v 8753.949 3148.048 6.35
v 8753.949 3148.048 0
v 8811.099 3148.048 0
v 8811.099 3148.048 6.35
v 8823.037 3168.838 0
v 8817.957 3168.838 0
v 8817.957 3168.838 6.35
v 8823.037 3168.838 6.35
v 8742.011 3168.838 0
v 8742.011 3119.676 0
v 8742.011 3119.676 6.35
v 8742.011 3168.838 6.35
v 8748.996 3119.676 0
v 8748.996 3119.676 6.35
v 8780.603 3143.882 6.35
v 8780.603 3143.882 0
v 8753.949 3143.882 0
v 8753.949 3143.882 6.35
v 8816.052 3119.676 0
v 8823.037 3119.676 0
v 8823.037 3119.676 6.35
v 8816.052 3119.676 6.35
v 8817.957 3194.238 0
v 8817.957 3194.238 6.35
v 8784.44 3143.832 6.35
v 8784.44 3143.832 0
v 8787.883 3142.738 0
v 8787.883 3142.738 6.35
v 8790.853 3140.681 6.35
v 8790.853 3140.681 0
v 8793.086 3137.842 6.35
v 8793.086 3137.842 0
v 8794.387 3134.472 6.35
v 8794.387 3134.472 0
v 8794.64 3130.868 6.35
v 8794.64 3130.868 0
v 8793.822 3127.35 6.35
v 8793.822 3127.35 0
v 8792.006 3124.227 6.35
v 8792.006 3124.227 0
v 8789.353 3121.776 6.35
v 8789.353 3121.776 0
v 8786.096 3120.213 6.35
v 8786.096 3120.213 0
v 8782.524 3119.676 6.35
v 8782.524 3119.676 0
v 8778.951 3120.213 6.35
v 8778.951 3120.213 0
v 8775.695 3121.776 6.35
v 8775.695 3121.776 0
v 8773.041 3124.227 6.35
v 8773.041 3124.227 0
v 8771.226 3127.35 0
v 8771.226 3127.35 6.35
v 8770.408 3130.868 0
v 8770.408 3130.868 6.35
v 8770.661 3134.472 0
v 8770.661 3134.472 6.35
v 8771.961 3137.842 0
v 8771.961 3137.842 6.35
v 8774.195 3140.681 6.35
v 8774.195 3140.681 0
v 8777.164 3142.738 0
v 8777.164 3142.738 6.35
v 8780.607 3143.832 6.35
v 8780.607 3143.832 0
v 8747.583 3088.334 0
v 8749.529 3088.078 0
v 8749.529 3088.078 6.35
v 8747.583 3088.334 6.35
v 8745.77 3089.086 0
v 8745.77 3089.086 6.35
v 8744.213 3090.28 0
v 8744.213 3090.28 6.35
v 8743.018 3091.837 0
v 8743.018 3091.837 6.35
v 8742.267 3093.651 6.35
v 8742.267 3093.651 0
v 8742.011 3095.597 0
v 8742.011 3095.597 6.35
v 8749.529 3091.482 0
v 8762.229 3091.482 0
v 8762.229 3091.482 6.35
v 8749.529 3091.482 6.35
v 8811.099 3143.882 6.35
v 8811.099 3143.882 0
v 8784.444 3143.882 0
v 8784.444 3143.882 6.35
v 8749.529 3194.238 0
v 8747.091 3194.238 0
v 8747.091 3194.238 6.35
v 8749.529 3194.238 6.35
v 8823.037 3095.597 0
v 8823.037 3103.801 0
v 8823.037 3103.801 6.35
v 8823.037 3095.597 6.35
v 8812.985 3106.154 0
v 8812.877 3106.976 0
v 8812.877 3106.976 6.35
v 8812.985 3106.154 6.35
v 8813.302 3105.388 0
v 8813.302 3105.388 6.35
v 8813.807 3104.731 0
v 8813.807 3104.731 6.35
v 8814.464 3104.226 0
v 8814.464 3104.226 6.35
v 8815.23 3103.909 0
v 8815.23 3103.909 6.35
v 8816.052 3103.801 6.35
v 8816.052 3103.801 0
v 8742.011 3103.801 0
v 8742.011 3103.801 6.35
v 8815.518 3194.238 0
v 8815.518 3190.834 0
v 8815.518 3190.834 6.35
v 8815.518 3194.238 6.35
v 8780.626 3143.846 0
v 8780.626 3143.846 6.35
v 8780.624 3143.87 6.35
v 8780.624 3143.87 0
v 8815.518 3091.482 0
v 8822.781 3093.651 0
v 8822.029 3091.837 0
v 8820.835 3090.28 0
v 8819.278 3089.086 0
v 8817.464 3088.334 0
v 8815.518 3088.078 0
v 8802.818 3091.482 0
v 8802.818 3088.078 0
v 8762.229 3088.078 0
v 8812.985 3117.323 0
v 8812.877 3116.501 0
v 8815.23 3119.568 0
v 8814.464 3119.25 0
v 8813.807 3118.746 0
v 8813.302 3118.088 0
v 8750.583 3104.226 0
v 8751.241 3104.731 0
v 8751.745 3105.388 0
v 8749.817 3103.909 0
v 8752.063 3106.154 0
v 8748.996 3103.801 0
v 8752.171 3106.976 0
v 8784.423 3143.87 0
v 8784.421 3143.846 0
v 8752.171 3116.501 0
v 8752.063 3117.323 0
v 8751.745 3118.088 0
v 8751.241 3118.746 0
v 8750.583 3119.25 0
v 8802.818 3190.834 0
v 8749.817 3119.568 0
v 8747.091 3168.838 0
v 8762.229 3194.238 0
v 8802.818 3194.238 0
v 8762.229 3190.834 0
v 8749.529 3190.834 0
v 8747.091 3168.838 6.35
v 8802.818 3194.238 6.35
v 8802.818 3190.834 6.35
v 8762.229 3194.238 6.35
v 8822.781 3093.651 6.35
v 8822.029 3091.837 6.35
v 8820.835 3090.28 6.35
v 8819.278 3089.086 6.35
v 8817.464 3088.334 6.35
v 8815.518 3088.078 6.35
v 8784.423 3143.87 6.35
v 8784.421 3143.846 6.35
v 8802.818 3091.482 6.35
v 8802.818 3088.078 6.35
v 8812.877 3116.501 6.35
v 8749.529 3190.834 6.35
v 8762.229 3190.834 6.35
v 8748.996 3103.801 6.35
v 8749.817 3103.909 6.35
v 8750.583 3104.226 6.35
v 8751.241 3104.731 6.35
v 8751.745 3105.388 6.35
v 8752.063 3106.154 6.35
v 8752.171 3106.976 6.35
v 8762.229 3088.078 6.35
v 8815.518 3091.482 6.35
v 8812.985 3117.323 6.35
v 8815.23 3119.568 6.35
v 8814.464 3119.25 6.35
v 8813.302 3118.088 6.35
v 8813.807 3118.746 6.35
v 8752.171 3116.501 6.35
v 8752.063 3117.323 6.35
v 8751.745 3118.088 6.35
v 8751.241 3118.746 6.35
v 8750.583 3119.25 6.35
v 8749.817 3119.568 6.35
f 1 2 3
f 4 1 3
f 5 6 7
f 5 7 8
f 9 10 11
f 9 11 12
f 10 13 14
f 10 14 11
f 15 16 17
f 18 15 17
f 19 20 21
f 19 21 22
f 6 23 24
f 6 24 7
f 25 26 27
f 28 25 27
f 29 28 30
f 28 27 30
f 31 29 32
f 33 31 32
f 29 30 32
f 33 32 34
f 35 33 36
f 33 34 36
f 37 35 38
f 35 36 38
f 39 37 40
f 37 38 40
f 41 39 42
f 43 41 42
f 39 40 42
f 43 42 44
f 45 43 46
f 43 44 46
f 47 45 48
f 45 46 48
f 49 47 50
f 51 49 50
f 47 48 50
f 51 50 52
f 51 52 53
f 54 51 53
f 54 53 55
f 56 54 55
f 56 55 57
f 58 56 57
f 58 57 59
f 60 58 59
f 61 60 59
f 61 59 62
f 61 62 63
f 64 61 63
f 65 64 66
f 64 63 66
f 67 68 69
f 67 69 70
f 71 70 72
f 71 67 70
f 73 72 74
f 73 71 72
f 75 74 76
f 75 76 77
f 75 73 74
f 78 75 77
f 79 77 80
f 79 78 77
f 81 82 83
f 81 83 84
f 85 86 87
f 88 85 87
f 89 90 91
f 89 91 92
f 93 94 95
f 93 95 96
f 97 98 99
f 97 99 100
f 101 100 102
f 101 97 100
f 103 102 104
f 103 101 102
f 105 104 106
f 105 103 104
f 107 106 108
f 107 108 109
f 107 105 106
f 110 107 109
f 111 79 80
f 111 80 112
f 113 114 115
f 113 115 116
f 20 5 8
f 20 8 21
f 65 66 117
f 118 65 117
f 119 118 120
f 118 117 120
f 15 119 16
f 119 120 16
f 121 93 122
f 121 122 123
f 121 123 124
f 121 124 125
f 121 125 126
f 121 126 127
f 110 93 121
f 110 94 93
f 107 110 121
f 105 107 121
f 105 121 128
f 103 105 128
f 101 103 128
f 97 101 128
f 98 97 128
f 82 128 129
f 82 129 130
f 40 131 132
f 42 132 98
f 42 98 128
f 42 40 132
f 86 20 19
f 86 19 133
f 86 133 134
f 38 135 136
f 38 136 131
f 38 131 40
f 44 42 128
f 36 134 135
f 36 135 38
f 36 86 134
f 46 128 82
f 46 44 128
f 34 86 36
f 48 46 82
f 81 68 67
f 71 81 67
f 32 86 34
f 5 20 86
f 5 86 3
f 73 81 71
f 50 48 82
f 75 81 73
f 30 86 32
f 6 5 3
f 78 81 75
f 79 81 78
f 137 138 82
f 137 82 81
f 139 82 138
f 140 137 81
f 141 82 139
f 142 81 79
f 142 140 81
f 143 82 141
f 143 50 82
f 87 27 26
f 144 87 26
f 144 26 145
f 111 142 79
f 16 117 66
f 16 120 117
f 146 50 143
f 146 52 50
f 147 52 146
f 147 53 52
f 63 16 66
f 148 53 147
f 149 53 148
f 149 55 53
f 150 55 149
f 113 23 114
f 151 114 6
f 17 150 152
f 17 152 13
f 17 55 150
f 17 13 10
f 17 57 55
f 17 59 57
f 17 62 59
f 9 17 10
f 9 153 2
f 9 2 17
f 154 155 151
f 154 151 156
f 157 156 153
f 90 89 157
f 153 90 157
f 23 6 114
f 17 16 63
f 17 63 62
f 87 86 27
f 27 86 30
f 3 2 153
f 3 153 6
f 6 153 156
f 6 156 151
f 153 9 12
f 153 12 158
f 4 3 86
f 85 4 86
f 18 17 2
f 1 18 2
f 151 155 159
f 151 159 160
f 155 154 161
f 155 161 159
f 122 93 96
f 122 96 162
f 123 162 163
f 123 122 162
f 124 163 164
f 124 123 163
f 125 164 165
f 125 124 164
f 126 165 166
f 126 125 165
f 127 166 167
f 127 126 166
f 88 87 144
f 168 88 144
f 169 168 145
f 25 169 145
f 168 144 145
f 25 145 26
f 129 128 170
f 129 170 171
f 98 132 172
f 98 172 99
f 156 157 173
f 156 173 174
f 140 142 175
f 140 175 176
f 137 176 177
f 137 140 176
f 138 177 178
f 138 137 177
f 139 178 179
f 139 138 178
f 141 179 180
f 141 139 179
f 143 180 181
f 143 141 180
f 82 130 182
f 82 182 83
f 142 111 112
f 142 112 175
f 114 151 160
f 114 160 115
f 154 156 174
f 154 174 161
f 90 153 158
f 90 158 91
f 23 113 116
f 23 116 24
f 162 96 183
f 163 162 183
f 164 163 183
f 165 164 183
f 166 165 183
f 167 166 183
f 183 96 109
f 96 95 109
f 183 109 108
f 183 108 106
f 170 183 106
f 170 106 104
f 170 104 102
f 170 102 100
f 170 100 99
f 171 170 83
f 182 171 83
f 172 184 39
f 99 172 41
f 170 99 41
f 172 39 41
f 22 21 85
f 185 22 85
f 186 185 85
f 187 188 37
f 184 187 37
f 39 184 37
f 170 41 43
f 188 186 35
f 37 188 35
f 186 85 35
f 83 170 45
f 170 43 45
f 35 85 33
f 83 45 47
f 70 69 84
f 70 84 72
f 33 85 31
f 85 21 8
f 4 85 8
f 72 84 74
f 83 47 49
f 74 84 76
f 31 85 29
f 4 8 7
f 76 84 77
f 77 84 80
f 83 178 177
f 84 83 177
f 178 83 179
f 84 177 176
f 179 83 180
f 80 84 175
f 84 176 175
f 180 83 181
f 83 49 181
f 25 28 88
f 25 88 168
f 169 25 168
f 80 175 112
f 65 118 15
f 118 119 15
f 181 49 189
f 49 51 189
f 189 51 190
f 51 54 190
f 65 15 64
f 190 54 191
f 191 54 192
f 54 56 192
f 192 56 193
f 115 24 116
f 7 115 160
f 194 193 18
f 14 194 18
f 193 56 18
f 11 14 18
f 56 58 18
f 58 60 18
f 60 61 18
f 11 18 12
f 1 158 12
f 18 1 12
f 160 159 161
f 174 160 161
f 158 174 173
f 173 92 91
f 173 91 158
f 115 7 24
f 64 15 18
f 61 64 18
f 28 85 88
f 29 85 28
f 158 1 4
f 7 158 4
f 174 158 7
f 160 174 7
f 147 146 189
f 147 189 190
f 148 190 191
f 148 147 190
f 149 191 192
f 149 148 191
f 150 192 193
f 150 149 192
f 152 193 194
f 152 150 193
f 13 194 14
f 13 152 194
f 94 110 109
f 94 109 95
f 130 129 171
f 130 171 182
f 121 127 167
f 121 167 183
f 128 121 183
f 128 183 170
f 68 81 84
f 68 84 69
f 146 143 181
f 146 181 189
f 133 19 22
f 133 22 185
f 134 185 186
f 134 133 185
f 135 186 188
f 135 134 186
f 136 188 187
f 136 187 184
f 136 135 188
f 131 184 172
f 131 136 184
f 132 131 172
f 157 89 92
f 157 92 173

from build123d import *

# Parameters (mm, degrees)
BOSS_EXTRUDE1_DEPTH = 6.35


with BuildPart() as part:
    # Sketch1 → Boss-Extrude1 (new body)
    with BuildSketch(Plane.XY):
        with BuildLine():
            Line((8823.036740753, 3168.83754785), (8823.036740753, 3119.67584785))
            Line((8823.036740753, 3119.67584785), (8816.051740753, 3119.67584785))
            ThreePointArc((8816.051740753, 3119.67584785), (8813.806676722, 3118.74591188), (8812.876740753, 3116.50084785))
            Line((8812.876740753, 3116.50084785), (8812.876740753, 3106.97584785))
            ThreePointArc((8812.876740753, 3106.97584785), (8813.806676722, 3104.73078382), (8816.051740753, 3103.80084785))
            Line((8816.051740753, 3103.80084785), (8823.036740753, 3103.80084785))
            Line((8823.036740753, 3103.80084785), (8823.036740753, 3095.59664785))
            ThreePointArc((8823.036740753, 3095.59664785), (8820.834652376, 3090.280336226), (8815.518340753, 3088.07824785))
            Line((8815.518340753, 3088.07824785), (8815.518340753, 3091.48184785))
            Line((8815.518340753, 3091.48184785), (8802.818340753, 3091.48184785))
            Line((8802.818340753, 3091.48184785), (8802.818340753, 3088.07824785))
            Line((8802.818340753, 3088.07824785), (8762.229140753, 3088.07824785))
            Line((8762.229140753, 3088.07824785), (8762.229140753, 3091.48184785))
            Line((8762.229140753, 3091.48184785), (8749.529140753, 3091.48184785))
            Line((8749.529140753, 3091.48184785), (8749.529140753, 3088.07824785))
            ThreePointArc((8749.529140753, 3088.07824785), (8744.212829129, 3090.280336226), (8742.010740753, 3095.59664785))
            Line((8742.010740753, 3095.59664785), (8742.010740753, 3103.80084785))
            Line((8742.010740753, 3103.80084785), (8748.995740753, 3103.80084785))
            ThreePointArc((8748.995740753, 3103.80084785), (8751.240804783, 3104.73078382), (8752.170740753, 3106.97584785))
            Line((8752.170740753, 3106.97584785), (8752.170740753, 3116.50084785))
            ThreePointArc((8752.170740753, 3116.50084785), (8751.240804783, 3118.74591188), (8748.995740753, 3119.67584785))
            Line((8748.995740753, 3119.67584785), (8742.010740753, 3119.67584785))
            Line((8742.010740753, 3119.67584785), (8742.010740753, 3168.83754785))
            Line((8742.010740753, 3168.83754785), (8747.090740753, 3168.83754785))
            Line((8747.090740753, 3168.83754785), (8747.090740753, 3194.23754785))
            Line((8747.090740753, 3194.23754785), (8749.529140753, 3194.23754785))
            Line((8749.529140753, 3194.23754785), (8749.529140753, 3190.83394785))
            Line((8749.529140753, 3190.83394785), (8762.229140753, 3190.83394785))
            Line((8762.229140753, 3190.83394785), (8762.229140753, 3194.23754785))
            Line((8762.229140753, 3194.23754785), (8802.818340753, 3194.23754785))
            Line((8802.818340753, 3194.23754785), (8802.818340753, 3190.83394785))
            Line((8802.818340753, 3190.83394785), (8815.518340753, 3190.83394785))
            Line((8815.518340753, 3190.83394785), (8815.518340753, 3194.23754785))
            Line((8815.518340753, 3194.23754785), (8817.956740753, 3194.23754785))
            Line((8817.956740753, 3194.23754785), (8817.956740753, 3168.83754785))
            Line((8817.956740753, 3168.83754785), (8823.036740753, 3168.83754785))
        make_face()
        with BuildLine():
            Line((8780.603057309, 3143.88204785), (8753.948740753, 3143.88204785))
            Line((8753.948740753, 3143.88204785), (8753.948740753, 3148.04764785))
            Line((8753.948740753, 3148.04764785), (8811.098740753, 3148.04764785))
            Line((8811.098740753, 3148.04764785), (8811.098740753, 3143.88204785))
            Line((8811.098740753, 3143.88204785), (8784.444424196, 3143.88204785))
            ThreePointArc((8784.444424196, 3143.88204785), (8784.419103776, 3143.858656943), (8784.440418599, 3143.831565681))
            ThreePointArc((8784.440418599, 3143.831565681), (8782.523740753, 3119.67584785), (8780.607062906, 3143.831565681))
            ThreePointArc((8780.607062906, 3143.831565681), (8780.628377729, 3143.858656943), (8780.603057309, 3143.88204785))
        make_face(mode=Mode.SUBTRACT)
    extrude(amount=BOSS_EXTRUDE1_DEPTH)


solid = part.part
